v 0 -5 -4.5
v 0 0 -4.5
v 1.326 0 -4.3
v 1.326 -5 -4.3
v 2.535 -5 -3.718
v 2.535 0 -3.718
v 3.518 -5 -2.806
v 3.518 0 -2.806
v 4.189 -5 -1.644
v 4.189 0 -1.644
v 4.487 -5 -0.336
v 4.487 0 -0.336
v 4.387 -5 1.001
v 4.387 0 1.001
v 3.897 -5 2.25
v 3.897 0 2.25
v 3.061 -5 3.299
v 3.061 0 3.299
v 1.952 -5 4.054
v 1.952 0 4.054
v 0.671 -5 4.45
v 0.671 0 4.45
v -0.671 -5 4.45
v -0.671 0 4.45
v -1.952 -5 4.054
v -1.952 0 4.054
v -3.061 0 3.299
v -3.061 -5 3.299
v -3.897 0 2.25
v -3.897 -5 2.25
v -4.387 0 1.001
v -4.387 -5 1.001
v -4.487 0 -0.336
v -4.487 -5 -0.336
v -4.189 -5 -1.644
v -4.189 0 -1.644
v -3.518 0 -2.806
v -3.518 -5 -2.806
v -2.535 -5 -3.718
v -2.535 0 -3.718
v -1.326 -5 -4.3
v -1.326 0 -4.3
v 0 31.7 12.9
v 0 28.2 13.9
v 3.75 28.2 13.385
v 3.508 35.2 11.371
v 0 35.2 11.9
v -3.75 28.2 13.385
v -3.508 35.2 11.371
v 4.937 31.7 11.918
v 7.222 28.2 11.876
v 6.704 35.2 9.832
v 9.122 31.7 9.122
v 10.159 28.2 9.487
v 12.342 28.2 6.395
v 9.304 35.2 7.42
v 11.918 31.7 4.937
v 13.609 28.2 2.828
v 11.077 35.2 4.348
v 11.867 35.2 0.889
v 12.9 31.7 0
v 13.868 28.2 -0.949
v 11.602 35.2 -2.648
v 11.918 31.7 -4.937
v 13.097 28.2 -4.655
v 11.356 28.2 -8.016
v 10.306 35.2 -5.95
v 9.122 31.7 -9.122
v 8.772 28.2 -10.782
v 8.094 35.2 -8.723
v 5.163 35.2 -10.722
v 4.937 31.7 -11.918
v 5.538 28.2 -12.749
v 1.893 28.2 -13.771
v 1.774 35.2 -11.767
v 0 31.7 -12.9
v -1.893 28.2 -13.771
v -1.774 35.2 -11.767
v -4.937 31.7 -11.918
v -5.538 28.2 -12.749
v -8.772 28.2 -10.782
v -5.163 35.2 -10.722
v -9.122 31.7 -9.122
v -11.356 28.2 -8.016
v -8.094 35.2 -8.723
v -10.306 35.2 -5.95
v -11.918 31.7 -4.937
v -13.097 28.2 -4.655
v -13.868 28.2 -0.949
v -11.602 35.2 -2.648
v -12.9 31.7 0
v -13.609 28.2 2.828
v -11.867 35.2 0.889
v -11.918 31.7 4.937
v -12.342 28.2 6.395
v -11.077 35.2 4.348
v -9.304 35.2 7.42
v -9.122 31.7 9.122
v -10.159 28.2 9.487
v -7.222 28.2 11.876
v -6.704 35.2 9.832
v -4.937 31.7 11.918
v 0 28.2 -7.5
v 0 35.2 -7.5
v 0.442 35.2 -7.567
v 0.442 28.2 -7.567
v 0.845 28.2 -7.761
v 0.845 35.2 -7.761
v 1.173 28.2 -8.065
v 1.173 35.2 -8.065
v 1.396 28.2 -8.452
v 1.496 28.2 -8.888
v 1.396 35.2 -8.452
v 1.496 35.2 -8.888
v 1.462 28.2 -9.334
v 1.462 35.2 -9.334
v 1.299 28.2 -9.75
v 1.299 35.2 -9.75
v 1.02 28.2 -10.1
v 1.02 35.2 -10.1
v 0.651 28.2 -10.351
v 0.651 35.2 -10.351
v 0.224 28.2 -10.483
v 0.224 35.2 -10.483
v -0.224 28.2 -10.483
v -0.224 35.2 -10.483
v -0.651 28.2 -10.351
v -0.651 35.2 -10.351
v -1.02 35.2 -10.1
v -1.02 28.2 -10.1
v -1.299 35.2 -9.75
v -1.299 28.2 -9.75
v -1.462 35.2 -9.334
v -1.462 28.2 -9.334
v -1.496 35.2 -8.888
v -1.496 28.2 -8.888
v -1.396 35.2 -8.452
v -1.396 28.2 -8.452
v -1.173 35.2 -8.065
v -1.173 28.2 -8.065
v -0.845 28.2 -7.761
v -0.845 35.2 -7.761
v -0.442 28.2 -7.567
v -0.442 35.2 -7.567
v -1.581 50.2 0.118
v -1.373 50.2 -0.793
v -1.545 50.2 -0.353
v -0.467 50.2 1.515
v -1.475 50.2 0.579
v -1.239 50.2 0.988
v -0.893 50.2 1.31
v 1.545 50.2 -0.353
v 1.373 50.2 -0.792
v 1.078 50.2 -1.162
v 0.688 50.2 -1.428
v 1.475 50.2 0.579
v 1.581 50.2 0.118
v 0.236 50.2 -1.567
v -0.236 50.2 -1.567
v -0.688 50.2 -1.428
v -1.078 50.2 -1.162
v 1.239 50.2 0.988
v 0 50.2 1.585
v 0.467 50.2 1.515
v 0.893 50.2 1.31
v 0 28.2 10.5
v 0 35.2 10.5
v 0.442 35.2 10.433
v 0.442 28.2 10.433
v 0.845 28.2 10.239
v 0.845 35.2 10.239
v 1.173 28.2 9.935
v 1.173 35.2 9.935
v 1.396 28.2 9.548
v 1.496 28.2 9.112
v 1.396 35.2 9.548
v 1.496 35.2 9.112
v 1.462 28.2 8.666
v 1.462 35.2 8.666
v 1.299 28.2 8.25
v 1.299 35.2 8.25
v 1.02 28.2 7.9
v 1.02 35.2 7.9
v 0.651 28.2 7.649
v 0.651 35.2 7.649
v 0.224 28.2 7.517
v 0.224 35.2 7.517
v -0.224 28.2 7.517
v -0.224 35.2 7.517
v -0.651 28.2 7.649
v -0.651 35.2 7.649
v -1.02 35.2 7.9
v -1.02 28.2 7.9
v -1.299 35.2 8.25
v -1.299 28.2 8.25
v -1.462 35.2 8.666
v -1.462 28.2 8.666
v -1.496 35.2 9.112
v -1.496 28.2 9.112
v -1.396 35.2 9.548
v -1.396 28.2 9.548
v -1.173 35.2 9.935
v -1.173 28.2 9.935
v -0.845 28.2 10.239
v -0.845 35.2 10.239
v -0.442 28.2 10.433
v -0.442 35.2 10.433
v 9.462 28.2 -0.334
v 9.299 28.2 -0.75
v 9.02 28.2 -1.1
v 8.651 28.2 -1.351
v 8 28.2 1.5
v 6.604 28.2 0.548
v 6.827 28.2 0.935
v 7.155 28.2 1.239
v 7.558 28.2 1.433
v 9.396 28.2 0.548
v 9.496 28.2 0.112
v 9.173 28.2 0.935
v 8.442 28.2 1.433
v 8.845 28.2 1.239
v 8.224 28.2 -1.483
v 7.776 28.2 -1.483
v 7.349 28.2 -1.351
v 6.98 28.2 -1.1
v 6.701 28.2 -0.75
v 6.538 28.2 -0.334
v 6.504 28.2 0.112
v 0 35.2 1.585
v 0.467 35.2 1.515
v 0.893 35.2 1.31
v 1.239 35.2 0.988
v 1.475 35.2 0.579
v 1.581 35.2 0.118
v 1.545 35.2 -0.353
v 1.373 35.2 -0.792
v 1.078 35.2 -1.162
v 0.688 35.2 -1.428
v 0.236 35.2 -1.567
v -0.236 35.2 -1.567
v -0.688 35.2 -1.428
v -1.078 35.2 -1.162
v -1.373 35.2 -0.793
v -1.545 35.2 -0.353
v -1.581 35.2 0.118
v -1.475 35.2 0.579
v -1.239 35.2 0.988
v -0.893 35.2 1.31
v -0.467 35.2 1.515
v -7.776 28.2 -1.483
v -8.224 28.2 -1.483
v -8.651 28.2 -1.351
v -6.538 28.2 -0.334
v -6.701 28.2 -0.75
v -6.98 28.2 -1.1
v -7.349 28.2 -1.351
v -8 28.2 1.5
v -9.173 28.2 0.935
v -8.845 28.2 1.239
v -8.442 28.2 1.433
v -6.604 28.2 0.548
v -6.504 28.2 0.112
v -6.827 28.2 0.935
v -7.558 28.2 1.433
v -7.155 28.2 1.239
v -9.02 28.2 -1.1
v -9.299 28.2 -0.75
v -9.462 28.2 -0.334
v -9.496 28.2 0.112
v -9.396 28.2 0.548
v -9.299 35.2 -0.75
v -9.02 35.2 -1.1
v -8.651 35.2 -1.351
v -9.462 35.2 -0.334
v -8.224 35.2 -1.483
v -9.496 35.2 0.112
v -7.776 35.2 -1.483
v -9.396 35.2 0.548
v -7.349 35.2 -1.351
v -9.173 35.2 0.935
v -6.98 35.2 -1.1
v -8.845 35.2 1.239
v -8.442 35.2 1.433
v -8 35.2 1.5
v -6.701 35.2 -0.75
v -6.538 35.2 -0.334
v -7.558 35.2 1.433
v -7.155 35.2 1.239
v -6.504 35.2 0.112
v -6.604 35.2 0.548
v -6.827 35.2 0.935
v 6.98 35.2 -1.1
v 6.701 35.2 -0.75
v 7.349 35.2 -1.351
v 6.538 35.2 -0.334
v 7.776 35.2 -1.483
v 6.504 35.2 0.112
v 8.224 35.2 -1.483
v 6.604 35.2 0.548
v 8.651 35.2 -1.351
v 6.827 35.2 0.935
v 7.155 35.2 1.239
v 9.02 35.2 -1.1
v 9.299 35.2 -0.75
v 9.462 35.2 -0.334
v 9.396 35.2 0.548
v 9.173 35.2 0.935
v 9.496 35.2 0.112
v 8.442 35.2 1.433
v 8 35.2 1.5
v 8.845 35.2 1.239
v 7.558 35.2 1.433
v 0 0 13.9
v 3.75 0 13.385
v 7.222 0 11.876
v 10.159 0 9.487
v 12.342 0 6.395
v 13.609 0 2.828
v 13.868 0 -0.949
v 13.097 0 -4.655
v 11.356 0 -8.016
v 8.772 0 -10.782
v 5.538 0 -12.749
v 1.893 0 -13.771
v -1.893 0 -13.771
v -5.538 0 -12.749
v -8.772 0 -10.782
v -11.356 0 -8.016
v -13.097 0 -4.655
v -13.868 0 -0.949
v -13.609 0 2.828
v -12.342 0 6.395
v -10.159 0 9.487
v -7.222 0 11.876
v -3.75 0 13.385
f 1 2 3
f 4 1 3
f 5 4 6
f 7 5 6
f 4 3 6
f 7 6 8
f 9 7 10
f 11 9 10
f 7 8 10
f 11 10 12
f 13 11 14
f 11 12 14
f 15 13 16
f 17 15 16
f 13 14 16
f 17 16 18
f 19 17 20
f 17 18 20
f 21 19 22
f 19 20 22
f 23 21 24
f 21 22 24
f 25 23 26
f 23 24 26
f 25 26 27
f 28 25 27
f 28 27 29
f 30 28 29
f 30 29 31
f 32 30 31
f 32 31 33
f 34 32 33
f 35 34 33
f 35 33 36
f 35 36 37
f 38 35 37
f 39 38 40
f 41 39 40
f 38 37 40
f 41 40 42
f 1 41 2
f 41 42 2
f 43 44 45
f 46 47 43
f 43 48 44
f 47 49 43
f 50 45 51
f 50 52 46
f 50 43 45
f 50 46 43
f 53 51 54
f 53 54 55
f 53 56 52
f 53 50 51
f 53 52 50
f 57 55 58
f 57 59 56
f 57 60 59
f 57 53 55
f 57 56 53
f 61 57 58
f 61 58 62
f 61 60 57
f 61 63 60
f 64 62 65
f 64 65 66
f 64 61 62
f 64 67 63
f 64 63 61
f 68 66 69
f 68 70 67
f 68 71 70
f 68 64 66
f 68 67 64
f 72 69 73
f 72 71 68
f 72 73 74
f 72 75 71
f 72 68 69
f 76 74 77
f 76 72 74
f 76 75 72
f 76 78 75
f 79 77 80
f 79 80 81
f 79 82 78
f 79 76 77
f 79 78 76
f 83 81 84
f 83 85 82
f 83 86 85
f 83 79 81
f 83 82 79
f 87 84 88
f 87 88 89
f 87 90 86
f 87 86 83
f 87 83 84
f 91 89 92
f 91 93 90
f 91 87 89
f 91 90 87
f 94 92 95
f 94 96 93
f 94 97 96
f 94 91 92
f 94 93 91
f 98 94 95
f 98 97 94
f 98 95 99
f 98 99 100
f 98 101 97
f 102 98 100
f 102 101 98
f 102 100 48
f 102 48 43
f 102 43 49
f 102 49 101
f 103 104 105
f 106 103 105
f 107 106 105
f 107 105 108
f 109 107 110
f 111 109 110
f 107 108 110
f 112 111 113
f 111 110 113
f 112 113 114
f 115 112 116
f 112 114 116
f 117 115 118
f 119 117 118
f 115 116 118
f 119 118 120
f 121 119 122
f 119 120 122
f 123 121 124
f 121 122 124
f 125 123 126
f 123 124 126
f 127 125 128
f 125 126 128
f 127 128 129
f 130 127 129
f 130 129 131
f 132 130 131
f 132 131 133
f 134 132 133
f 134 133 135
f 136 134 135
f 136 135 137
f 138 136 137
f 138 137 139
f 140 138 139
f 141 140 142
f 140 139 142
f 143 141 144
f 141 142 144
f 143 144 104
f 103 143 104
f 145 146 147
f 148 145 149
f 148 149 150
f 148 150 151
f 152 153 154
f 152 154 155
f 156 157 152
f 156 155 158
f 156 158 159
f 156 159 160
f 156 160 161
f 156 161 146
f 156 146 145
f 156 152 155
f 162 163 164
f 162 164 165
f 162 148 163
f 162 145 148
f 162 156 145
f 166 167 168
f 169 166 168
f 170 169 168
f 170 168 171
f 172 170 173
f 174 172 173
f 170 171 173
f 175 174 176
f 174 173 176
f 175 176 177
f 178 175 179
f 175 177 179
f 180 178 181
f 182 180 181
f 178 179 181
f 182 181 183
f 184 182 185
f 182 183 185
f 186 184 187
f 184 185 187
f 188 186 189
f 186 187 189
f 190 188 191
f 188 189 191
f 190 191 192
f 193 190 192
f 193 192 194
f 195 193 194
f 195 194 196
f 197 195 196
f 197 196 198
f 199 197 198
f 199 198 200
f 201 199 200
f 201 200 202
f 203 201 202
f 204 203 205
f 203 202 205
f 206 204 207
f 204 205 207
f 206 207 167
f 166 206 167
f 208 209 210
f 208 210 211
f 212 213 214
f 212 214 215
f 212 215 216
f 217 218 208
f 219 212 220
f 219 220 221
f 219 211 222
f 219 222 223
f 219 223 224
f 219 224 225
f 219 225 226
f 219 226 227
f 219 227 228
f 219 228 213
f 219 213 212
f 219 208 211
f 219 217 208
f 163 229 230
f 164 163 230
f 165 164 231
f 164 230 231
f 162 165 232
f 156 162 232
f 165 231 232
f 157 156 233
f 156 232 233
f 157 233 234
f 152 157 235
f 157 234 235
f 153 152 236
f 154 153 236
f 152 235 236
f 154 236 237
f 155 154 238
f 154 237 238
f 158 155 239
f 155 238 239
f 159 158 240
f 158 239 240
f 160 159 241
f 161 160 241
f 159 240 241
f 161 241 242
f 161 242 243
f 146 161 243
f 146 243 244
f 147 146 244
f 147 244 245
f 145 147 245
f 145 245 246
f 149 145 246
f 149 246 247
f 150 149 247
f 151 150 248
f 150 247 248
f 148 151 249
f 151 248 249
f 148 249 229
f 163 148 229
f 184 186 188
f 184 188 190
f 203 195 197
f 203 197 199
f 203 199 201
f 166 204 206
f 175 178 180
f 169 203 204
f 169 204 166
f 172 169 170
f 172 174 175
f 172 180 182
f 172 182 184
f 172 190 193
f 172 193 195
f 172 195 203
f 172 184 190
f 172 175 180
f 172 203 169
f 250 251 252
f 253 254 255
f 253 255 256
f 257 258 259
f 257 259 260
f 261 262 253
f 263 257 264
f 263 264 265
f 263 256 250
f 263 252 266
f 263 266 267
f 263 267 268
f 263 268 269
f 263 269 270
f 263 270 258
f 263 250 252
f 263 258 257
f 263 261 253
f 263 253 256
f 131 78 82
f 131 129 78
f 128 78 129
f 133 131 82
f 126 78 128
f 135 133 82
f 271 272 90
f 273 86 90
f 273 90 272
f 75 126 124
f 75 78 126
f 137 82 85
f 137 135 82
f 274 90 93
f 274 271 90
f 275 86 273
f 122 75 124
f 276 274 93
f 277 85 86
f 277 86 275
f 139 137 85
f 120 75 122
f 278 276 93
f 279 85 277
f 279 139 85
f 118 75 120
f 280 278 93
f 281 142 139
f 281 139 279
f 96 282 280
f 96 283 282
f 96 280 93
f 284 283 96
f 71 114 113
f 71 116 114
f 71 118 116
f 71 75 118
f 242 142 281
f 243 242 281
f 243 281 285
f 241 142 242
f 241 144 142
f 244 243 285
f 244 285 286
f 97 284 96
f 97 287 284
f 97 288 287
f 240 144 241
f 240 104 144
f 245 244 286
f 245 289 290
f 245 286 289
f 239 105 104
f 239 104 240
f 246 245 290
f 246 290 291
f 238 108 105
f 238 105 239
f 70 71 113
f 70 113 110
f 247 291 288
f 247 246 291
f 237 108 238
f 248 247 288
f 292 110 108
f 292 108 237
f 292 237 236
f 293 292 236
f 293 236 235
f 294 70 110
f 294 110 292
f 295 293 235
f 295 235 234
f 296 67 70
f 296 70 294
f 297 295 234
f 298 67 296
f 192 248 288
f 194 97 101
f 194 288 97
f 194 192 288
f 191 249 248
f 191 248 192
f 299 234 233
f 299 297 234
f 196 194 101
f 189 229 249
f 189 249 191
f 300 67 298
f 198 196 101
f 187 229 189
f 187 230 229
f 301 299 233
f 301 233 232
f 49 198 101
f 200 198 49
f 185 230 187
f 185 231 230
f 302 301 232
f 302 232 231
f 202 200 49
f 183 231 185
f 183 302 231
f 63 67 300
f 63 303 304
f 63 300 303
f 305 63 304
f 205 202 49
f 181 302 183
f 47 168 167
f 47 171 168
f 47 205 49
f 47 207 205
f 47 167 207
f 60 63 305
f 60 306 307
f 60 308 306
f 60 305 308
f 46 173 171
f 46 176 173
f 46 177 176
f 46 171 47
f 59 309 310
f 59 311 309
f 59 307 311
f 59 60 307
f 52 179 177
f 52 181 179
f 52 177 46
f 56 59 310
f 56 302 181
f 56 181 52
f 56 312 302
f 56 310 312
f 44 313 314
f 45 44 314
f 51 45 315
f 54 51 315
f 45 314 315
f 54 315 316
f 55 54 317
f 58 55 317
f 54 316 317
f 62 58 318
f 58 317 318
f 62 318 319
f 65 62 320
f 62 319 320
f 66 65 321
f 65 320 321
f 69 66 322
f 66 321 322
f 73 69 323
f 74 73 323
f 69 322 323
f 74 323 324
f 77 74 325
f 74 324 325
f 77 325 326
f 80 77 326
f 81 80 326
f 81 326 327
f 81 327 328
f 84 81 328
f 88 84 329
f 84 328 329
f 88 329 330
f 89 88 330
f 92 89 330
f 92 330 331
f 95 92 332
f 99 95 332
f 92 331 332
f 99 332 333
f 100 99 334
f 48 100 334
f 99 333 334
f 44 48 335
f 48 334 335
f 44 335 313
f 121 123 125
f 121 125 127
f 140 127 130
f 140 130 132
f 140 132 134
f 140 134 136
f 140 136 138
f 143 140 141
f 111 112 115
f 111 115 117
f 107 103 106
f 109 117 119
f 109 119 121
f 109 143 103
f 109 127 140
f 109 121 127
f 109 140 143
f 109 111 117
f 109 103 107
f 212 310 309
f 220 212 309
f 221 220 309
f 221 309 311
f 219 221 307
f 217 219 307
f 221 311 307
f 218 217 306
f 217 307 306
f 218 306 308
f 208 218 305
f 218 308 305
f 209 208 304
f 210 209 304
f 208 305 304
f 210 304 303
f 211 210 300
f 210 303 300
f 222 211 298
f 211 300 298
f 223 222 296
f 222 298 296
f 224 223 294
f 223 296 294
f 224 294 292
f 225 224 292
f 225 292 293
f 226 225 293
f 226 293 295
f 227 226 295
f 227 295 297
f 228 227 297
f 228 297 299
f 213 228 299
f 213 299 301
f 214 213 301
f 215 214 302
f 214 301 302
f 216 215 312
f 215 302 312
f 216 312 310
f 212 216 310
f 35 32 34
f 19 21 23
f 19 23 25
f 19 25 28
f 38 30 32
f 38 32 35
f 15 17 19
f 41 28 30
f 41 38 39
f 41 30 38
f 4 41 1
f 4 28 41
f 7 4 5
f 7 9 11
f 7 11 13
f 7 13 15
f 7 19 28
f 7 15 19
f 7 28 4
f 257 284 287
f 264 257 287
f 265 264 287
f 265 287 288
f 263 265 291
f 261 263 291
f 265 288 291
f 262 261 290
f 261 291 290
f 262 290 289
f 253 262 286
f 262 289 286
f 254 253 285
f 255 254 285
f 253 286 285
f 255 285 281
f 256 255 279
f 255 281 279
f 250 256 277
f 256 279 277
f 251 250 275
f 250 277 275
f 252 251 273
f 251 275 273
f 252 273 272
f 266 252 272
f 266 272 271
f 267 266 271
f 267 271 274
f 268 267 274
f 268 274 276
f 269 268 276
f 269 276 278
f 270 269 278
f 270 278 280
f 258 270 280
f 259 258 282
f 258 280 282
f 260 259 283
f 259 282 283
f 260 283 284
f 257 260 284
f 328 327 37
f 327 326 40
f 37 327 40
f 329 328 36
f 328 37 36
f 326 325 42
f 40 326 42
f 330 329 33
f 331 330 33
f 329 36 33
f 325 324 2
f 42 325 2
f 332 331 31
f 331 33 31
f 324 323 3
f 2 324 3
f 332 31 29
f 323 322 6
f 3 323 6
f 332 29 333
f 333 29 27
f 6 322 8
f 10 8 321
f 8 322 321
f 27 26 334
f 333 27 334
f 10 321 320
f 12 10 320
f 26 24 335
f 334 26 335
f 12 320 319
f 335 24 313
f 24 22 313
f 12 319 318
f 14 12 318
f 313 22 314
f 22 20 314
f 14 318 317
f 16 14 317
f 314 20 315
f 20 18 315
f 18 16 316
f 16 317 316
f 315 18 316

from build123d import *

# Parameters (mm, degrees)
SKETCH1_R           = 13.9
BOSS_EXTRUDE1_DEPTH = 35.2
SKETCH2_R           = 1.585
BOSS_EXTRUDE2_DEPTH = 15
SKETCH4_R           = 1.5
CUT_EXTRUDE1_DEPTH  = 7
CHAMFER1_SIZE       = 7
CHAMFER1_SIZE2      = 2
SKETCH5_R           = 4.5
BOSS_EXTRUDE3_DEPTH = 5


with BuildPart() as part:
    # Sketch1 → Boss-Extrude1 (new body)
    with BuildSketch(Plane(origin=(0, 0, 0), x_dir=(1, 0, 0), z_dir=(0, 1, 0))):
        with Locations(Location((0, 0, 0), (0, 0, 270))):
            Circle(SKETCH1_R)
    extrude(amount=BOSS_EXTRUDE1_DEPTH)

    # Sketch2 → Boss-Extrude2 (add)
    with BuildSketch(Plane(origin=(0, 35.2, 0), x_dir=(1, 0, 0), z_dir=(0, 1, 0))):
        with Locations(Location((0, 0, 0), (0, 0, 270))):
            Circle(SKETCH2_R)
    extrude(amount=BOSS_EXTRUDE2_DEPTH)

    # Sketch4 → Cut-Extrude1 (cut)
    with BuildSketch(Plane(origin=(0, 35.2, 0), x_dir=(1, 0, 0), z_dir=(0, 1, 0))):
        with Locations(Location((0, 9, 0), (0, 0, 270))):
            Circle(SKETCH4_R)
        with Locations(Location((-8, 0, 0), (0, 0, 270))):
            Circle(SKETCH4_R)
        with Locations(Location((8, 0, 0), (0, 0, 270))):
            Circle(SKETCH4_R)
        with Locations(Location((0, -9, 0), (0, 0, 270))):
            Circle(SKETCH4_R)
    extrude(amount=-CUT_EXTRUDE1_DEPTH, mode=Mode.SUBTRACT)

    # Chamfer1
    chamfer1_edges = [part.edges().sort_by_distance(p)[0] for p in [
        (0, 35.2, -13.9),
    ]]
    chamfer1_side = [part.faces().sort_by_distance(p)[0] for p in [
        (0, 17.6, -13.9),
    ]]
    chamfer(chamfer1_edges, length=CHAMFER1_SIZE, length2=CHAMFER1_SIZE2, reference=chamfer1_side[0])

    # Sketch5 → Boss-Extrude3 (add)
    with BuildSketch(Plane.XZ):
        with Locations(Location((0, 0, 0), (0, 0, 270))):
            Circle(SKETCH5_R)
    extrude(amount=BOSS_EXTRUDE3_DEPTH)


solid = part.part
